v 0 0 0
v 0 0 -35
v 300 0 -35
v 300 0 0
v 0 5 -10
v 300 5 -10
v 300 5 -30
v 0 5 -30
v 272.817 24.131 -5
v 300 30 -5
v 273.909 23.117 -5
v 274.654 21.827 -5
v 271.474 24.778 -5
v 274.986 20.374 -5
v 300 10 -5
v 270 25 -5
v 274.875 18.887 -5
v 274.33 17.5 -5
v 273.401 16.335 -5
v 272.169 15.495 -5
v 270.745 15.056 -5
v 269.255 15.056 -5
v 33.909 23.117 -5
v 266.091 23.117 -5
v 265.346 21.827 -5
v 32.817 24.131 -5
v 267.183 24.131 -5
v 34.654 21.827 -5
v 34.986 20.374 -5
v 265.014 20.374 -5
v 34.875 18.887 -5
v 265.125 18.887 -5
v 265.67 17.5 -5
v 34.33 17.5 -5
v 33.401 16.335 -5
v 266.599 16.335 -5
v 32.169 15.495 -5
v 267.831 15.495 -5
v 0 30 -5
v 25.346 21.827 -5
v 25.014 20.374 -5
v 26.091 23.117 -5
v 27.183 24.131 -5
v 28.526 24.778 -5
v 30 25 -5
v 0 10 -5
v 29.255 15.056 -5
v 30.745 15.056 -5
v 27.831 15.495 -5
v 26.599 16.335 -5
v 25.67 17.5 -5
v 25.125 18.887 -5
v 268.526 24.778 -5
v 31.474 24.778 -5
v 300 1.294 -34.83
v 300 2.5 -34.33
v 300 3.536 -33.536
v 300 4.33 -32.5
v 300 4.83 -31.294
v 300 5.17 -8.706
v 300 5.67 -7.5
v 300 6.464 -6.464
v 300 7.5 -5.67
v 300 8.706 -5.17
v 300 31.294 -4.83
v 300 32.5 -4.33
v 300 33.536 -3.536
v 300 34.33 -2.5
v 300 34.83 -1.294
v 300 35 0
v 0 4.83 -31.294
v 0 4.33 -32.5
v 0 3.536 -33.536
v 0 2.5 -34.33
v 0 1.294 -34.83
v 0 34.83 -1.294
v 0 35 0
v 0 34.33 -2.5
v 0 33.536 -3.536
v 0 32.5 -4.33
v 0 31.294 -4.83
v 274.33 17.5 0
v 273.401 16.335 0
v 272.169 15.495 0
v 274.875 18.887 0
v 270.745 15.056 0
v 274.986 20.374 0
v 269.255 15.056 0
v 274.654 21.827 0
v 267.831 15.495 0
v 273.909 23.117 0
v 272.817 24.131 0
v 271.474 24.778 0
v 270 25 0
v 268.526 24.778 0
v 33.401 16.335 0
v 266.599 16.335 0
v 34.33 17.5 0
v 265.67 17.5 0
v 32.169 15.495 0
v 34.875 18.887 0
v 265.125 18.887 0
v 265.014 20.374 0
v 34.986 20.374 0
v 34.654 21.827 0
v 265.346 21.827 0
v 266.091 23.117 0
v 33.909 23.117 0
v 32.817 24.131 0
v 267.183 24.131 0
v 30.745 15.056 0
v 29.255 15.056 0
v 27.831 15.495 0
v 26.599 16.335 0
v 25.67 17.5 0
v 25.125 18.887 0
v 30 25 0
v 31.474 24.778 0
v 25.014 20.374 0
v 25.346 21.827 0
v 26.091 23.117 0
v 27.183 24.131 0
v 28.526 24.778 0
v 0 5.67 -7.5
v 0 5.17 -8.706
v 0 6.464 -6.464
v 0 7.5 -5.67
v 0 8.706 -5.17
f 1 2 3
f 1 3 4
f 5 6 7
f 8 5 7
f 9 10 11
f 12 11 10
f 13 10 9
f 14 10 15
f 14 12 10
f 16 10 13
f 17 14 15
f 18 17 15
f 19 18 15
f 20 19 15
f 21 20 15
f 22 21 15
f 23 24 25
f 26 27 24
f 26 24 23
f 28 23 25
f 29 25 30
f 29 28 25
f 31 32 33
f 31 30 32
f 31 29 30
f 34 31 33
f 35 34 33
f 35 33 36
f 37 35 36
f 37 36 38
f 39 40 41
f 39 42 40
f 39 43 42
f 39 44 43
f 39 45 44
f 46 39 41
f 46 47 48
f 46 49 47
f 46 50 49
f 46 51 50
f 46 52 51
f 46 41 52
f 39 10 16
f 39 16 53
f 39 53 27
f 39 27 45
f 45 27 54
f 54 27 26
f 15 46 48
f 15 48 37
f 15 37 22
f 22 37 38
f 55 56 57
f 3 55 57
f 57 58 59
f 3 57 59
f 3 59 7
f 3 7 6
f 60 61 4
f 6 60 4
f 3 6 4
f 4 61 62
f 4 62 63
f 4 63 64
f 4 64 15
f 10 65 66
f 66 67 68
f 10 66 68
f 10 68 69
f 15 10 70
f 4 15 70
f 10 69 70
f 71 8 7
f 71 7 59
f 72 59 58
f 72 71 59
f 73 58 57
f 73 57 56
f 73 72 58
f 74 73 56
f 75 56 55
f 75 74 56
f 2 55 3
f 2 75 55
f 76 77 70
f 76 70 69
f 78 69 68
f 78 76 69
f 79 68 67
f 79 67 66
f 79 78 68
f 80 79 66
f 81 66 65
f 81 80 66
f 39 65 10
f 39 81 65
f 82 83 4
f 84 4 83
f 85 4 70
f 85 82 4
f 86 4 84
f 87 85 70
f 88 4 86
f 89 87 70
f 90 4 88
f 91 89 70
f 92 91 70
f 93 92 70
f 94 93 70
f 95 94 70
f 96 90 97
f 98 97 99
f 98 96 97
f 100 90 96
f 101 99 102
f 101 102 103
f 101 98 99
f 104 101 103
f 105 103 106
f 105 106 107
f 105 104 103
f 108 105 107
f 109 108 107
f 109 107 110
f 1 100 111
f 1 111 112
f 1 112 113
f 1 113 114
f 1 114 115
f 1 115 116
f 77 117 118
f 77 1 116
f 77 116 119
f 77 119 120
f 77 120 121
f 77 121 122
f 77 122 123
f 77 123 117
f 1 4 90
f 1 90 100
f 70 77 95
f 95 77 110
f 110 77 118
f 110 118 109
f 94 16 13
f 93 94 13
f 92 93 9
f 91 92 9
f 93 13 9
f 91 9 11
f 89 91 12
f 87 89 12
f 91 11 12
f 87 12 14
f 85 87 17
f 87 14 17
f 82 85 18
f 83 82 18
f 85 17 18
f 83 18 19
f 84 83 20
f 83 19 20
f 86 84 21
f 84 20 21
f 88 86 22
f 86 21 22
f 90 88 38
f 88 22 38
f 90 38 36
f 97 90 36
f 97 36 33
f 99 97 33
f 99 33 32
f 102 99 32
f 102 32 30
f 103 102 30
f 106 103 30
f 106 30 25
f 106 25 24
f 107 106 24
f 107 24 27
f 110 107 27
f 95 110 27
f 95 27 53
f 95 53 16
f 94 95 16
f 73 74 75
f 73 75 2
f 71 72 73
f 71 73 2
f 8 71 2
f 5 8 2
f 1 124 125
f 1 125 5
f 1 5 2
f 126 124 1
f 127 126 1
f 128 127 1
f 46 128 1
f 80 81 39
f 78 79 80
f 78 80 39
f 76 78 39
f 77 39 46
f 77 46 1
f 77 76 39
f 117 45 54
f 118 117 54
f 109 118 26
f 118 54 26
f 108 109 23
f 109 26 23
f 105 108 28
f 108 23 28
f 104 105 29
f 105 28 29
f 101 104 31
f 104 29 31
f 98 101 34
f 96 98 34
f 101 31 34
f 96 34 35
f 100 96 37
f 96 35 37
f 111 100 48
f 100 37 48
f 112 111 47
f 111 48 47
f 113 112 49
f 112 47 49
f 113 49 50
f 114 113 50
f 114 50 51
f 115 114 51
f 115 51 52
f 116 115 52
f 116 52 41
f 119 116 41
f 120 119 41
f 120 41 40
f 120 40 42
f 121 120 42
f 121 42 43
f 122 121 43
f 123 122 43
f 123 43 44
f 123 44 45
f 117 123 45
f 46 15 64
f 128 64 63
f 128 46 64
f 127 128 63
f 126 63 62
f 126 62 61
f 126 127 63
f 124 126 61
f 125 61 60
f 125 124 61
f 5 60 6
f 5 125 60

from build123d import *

# Parameters (mm, degrees)
K_TOWNIK_STALOWY_35_X_35_X_5_1_DEPTH = 300
SZKIC2_R                             = 5
WYTNIJ_WYCI_GNI_CIE1_DEPTH           = 304.521004216


with BuildPart() as part:
    # Sketch1 → Kątownik stalowy 35 X 35 X 5(1) (new body)
    with BuildSketch(Plane(origin=(0, 0, 0), x_dir=(0, 0, -1), z_dir=(1, 0, 0))):
        with BuildLine():
            Line((0, 0), (0, 35))
            ThreePointArc((0, 35), (3.535533906, 33.535533906), (5, 30))
            Line((5, 30), (5, 10))
            ThreePointArc((5, 10), (6.464466094, 6.464466094), (10, 5))
            Line((10, 5), (30, 5))
            ThreePointArc((30, 5), (33.535533906, 3.535533906), (35, 0))
            Line((35, 0), (0, 0))
        make_face()
    extrude(amount=K_TOWNIK_STALOWY_35_X_35_X_5_1_DEPTH)

    # Szkic2 → Wytnij-wyciągnięcie1 (cut, through all)
    with BuildSketch(Plane(origin=(0, 0, -5), x_dir=(-1, 0, 0), z_dir=(0, 0, -1))):
        with Locations(Location((-270, 20, 0), (0, 0, 90))):
            Circle(SZKIC2_R)
        with Locations(Location((-30, 20, 0), (0, 0, 90))):
            Circle(SZKIC2_R)
    extrude(amount=-WYTNIJ_WYCI_GNI_CIE1_DEPTH, mode=Mode.SUBTRACT)


solid = part.part
